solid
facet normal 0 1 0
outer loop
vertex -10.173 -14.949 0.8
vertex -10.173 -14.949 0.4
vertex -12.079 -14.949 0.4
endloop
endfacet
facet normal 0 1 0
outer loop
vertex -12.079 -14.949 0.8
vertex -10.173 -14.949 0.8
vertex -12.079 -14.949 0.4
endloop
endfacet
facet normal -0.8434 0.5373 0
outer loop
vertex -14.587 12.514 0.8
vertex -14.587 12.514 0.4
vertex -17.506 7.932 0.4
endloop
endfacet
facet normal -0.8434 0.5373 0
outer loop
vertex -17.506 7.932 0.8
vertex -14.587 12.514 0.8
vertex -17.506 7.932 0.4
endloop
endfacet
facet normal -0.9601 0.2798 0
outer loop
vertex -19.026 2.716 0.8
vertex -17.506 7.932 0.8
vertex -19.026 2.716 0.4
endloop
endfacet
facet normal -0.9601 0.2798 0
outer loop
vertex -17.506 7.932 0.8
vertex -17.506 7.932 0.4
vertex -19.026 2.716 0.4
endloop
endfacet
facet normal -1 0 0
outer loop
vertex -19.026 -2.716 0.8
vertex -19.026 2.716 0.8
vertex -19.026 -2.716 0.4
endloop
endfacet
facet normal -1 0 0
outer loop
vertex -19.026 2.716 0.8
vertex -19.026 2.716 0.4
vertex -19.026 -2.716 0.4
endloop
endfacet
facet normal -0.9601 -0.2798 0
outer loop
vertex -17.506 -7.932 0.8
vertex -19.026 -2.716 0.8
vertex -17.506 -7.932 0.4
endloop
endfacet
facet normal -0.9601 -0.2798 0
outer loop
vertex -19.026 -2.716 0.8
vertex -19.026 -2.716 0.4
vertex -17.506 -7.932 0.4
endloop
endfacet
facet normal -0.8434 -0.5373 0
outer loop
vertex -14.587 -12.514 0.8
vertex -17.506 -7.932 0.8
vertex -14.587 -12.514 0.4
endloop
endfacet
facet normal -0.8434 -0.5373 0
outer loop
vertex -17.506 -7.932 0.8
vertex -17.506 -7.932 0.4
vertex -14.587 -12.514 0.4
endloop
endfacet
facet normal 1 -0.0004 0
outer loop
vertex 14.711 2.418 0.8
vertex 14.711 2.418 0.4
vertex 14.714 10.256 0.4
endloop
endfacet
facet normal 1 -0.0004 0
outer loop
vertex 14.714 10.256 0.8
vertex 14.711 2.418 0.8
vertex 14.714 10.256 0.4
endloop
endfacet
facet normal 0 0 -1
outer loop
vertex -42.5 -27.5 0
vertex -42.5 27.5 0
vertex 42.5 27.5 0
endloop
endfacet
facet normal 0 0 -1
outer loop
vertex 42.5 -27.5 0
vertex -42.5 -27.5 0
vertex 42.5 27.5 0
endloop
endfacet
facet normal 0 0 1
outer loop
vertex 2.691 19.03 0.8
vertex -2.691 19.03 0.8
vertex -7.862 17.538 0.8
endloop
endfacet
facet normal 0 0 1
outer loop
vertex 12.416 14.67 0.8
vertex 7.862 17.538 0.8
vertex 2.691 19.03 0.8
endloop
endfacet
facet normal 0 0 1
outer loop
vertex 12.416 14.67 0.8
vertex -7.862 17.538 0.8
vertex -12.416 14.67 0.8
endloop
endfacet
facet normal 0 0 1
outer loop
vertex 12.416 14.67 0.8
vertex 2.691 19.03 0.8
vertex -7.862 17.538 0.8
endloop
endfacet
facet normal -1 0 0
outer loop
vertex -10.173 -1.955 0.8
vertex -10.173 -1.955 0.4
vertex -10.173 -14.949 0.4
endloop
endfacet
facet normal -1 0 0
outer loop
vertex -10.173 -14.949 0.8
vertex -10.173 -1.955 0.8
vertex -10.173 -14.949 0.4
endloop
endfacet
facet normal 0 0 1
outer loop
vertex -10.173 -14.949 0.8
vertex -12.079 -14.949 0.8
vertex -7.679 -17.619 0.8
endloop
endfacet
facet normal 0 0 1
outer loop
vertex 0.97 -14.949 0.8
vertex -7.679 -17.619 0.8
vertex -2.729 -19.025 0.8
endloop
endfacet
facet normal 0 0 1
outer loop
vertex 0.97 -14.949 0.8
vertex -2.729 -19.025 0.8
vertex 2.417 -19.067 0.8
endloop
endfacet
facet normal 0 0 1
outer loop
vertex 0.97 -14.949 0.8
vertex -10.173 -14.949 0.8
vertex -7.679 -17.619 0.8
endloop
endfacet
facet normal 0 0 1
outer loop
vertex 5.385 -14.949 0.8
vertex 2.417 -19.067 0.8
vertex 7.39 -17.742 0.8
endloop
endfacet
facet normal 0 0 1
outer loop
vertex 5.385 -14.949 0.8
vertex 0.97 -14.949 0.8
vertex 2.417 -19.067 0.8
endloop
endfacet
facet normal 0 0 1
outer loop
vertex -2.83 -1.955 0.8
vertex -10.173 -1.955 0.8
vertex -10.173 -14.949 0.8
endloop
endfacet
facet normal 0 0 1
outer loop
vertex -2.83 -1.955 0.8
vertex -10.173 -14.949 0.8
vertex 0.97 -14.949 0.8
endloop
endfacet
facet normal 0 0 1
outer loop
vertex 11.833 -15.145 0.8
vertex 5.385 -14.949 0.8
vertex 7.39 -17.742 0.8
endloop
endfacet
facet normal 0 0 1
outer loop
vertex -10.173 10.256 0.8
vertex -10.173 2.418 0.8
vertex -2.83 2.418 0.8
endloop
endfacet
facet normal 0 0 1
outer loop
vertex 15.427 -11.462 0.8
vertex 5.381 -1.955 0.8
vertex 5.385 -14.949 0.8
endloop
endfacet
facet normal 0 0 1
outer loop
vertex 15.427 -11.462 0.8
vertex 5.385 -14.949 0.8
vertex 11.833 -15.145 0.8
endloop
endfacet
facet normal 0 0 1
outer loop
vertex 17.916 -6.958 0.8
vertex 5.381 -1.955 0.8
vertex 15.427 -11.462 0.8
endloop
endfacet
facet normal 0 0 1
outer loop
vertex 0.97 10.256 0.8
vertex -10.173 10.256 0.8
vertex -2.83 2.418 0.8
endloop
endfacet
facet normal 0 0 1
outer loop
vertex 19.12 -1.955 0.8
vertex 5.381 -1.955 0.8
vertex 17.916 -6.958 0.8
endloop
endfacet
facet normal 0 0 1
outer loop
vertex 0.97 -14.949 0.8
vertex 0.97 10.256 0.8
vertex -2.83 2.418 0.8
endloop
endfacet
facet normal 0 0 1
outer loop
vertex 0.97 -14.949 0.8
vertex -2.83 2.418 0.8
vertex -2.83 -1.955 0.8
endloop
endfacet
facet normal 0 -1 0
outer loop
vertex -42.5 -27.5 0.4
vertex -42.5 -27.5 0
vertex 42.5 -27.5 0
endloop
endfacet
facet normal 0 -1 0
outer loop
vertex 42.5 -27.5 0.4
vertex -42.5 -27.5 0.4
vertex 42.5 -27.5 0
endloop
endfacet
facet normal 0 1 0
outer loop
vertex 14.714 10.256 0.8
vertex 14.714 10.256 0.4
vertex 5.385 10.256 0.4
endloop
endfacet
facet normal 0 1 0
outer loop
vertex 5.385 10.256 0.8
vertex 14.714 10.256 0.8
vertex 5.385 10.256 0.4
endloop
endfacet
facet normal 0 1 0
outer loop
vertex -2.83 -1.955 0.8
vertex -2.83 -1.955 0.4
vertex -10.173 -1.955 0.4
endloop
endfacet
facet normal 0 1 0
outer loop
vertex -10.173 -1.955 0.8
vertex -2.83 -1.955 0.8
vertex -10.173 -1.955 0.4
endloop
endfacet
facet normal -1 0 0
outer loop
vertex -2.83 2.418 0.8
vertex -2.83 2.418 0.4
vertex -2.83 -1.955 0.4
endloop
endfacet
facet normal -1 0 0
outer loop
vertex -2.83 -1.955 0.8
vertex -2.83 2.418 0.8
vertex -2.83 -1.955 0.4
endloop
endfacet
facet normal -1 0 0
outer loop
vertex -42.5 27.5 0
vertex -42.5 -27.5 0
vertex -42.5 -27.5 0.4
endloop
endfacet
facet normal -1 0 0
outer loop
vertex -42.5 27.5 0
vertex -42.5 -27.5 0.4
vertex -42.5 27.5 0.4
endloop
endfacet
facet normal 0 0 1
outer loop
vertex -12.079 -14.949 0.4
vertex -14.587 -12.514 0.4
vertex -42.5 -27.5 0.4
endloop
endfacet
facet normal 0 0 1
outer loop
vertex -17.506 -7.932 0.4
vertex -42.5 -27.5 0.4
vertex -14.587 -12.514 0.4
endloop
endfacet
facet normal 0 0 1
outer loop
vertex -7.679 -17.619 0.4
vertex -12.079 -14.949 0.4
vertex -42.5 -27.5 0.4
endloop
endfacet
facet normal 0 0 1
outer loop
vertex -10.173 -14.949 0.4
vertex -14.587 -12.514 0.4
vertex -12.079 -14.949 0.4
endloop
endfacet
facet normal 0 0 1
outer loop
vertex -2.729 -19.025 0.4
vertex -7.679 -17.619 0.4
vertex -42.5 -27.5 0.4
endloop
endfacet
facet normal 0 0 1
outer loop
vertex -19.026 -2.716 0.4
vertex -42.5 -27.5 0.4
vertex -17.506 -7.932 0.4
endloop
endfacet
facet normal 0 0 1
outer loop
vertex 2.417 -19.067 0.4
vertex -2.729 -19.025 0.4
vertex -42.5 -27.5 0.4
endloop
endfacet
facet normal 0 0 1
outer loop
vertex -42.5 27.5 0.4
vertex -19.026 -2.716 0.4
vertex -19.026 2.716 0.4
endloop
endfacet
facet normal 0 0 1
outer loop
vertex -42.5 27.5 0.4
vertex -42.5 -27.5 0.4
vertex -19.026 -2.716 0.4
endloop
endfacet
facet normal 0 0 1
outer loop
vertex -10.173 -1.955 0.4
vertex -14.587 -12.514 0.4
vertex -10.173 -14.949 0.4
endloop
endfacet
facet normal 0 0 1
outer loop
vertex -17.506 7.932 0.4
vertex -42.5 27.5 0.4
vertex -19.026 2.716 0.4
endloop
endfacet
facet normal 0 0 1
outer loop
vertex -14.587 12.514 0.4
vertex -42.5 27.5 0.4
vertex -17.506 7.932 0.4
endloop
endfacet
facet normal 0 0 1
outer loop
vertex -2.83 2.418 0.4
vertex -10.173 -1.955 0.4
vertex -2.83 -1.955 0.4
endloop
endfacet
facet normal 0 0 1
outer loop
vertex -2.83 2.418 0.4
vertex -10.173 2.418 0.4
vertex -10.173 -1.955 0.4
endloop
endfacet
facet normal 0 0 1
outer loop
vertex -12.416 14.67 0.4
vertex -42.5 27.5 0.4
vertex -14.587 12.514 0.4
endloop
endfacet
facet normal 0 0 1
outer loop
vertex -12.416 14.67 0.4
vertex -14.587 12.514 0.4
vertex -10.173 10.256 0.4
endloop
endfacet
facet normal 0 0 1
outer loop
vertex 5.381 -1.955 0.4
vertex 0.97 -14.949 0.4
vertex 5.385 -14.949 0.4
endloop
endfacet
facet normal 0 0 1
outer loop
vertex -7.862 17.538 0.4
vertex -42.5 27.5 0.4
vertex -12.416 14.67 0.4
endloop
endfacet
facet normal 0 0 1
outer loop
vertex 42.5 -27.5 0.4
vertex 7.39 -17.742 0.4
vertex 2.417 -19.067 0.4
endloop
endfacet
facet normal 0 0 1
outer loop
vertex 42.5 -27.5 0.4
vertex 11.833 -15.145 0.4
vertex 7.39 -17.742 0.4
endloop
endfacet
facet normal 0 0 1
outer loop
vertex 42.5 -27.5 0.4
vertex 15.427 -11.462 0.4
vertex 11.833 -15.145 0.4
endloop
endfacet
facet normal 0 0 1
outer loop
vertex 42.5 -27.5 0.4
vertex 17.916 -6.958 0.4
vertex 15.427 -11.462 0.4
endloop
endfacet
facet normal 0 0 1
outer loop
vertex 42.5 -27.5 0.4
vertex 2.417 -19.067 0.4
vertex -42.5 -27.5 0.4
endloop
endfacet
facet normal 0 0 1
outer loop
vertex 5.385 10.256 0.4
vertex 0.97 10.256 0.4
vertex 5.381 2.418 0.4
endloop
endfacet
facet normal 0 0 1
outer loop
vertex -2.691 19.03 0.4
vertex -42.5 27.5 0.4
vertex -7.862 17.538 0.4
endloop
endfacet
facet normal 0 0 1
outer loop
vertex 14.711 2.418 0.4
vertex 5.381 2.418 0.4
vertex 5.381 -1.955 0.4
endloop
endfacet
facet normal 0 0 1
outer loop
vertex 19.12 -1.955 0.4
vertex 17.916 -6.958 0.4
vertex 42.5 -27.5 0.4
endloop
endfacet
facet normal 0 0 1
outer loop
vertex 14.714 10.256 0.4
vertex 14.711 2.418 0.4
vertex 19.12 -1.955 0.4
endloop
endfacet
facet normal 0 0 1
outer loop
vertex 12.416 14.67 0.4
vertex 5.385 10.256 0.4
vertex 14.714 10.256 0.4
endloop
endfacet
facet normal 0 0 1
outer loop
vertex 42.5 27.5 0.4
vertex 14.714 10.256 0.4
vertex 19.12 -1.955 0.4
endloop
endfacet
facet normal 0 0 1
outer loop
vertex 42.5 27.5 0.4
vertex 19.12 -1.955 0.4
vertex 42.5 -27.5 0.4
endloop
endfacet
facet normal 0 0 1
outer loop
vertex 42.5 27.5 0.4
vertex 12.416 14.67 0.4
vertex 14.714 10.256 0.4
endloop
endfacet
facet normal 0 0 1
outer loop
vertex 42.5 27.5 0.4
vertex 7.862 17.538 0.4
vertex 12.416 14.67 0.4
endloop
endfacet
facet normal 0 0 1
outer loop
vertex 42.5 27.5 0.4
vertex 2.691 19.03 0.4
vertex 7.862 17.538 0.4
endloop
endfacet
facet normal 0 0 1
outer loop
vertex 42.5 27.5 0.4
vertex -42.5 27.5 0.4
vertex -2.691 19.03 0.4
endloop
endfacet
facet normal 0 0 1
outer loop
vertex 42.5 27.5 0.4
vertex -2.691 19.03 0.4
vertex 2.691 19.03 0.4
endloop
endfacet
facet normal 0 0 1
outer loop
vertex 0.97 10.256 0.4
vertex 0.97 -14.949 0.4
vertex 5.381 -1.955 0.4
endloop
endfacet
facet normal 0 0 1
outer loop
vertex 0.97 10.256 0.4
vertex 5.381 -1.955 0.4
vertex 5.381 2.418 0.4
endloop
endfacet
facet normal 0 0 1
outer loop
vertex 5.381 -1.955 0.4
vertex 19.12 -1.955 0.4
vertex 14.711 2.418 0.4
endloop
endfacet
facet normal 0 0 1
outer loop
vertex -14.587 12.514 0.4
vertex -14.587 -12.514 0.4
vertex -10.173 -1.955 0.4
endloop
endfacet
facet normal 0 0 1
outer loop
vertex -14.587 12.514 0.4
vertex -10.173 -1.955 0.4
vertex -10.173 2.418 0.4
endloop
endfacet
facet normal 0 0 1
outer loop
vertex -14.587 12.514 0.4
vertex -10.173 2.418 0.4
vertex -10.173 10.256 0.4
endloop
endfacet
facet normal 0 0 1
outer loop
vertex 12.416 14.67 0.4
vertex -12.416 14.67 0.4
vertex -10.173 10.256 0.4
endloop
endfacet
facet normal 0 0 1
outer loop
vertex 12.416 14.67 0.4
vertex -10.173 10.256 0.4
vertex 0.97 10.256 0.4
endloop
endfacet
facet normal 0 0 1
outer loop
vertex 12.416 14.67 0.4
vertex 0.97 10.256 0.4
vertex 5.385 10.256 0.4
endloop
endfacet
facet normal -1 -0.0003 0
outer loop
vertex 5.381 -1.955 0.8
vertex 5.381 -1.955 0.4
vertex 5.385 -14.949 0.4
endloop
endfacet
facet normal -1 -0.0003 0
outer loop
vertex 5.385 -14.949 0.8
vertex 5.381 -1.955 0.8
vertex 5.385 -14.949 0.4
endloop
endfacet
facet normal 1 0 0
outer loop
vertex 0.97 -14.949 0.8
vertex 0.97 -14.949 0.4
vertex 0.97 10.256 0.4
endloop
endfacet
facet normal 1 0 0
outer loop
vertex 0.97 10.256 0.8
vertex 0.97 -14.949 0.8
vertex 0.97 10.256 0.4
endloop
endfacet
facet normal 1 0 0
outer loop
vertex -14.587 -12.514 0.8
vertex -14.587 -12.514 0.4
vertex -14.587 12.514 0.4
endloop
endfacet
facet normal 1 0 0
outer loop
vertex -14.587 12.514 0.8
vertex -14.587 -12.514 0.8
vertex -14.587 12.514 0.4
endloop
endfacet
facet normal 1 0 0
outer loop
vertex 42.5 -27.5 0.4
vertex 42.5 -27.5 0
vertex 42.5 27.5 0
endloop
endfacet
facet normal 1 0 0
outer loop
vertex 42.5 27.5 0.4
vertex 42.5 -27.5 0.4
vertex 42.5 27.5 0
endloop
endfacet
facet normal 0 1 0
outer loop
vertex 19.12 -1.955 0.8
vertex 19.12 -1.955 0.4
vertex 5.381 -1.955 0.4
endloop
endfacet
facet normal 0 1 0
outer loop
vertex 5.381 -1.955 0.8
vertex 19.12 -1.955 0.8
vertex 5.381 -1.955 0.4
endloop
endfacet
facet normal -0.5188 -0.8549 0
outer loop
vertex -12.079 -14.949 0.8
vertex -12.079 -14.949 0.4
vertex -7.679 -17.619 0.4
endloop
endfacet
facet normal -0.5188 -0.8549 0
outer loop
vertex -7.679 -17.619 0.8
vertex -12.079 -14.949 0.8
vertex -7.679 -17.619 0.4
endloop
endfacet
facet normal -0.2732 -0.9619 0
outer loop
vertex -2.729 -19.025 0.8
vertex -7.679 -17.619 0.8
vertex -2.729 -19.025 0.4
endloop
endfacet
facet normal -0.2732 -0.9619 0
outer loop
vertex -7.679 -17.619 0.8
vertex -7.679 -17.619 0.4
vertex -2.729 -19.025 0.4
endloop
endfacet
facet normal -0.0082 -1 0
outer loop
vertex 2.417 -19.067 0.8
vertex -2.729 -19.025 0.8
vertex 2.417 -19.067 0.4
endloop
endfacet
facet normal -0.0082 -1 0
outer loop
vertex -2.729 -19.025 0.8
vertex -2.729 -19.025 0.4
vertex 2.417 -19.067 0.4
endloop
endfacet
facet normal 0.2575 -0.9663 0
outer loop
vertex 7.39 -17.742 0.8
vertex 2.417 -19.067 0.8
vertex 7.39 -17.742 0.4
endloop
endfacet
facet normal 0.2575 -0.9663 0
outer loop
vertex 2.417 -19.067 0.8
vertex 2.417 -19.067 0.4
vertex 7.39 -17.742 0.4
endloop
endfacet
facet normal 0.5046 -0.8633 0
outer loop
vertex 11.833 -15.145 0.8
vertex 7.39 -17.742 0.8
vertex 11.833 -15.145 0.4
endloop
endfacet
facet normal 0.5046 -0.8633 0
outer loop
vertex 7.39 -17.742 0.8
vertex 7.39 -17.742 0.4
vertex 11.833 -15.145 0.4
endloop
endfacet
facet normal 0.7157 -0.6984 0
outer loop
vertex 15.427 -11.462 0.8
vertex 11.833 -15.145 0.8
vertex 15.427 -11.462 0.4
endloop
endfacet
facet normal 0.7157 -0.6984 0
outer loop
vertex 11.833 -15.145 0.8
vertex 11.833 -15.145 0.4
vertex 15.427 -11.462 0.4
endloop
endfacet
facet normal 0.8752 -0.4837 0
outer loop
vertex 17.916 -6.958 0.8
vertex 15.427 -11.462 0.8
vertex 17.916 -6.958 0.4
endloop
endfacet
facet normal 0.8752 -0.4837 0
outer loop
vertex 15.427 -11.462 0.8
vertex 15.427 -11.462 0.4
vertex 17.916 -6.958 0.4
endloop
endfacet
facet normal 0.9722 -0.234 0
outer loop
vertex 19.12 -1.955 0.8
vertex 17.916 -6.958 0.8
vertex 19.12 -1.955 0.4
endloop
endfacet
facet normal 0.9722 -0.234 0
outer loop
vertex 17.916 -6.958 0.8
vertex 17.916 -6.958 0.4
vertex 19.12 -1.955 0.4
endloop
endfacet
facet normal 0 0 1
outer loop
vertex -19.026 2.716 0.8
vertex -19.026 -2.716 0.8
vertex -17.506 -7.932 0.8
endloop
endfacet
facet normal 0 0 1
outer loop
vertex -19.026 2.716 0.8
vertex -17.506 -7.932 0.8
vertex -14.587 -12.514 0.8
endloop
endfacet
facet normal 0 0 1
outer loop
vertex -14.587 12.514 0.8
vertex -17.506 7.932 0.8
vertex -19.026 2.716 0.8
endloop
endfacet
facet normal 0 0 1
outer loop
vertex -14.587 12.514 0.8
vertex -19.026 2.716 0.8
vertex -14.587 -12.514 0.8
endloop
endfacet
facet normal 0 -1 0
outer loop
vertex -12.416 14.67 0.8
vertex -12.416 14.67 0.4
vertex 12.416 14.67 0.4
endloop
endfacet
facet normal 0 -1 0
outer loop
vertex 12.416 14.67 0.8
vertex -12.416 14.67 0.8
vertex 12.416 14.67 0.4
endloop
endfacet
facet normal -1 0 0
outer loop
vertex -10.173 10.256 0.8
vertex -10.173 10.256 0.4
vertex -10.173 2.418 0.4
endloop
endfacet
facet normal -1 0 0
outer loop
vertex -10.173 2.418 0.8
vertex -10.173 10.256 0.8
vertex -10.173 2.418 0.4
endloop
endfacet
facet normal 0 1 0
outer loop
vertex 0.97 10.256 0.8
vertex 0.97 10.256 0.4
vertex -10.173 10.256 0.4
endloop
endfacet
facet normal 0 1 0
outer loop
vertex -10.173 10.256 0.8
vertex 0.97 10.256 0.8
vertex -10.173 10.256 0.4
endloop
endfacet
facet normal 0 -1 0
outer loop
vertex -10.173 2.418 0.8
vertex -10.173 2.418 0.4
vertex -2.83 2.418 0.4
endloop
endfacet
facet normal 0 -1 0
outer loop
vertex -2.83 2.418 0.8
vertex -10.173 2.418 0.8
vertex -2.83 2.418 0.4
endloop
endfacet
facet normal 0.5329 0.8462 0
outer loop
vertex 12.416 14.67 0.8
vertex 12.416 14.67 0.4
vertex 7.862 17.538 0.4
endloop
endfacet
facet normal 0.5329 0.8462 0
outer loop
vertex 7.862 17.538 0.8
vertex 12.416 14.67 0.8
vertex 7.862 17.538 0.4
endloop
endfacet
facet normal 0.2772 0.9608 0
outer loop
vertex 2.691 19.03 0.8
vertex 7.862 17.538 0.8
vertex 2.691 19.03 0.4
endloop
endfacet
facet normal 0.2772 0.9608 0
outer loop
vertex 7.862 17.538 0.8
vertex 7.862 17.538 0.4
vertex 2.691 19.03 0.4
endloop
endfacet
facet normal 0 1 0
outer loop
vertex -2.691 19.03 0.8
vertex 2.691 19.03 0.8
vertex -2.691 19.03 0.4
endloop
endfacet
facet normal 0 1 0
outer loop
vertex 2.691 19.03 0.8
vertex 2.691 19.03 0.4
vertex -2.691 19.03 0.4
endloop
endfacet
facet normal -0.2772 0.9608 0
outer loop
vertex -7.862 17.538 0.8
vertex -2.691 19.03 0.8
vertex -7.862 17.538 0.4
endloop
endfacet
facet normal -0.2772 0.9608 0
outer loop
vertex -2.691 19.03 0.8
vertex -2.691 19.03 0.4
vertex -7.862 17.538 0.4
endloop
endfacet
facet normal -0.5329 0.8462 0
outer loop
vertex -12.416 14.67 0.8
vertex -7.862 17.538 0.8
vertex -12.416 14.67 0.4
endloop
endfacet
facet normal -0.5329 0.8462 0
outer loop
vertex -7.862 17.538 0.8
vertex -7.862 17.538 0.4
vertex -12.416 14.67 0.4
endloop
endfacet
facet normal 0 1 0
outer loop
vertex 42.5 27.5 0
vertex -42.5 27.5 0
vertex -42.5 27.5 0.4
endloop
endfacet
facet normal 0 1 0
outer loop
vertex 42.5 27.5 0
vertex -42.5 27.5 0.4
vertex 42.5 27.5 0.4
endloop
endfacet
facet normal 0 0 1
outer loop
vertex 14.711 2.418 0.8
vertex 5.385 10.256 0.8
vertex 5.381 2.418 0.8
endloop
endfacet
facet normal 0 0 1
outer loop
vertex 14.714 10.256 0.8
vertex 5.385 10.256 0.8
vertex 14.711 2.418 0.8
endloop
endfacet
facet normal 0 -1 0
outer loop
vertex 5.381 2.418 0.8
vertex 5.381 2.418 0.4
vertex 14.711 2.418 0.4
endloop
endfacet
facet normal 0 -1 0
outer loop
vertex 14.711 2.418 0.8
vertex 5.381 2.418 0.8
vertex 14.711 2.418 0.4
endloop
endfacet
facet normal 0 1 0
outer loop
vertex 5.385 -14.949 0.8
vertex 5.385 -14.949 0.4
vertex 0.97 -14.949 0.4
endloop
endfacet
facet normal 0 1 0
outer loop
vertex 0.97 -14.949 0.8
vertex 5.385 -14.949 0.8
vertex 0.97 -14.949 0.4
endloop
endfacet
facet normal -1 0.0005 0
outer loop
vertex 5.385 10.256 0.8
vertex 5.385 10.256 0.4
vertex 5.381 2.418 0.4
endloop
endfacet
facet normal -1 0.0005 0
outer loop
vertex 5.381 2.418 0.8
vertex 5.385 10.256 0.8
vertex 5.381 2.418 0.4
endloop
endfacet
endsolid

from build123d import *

# Parameters (mm, degrees)
F0_W     = 85
F0_H     = 55
F1_DEPTH = 0.4
F3_DEPTH = 0.4


with BuildPart() as f1:
    # F0 (on Top) → F1 (new body)
    with BuildSketch(Plane.XY):
        Rectangle(F0_W, F0_H)
    extrude(amount=F1_DEPTH)

    # F2 (on face) → F3 (join)
    with BuildSketch(Plane.XY.offset(0.4)):
        with BuildLine():
            Line((-10.172568, 10.256139), (-10.172568, 2.418078))
            Line((-10.172568, 2.418078), (-2.829556, 2.418078))
            Line((-2.829556, 2.418078), (-2.829556, -1.954707))
            Line((-2.829556, -1.954707), (-10.172568, -1.954707))
            Line((-10.172568, -1.954707), (-10.172568, -14.949387))
            Line((-10.172568, -14.949387), (-12.078729, -14.949387))
            ThreePointArc((-12.078729, -14.949387), (7.389782, -17.741787), (19.119597, -1.954707))
            Line((19.119597, -1.954707), (5.381422, -1.954707))
            Line((5.381422, -1.954707), (5.384529, -14.949387))
            Line((5.384529, -14.949387), (0.97045, -14.949387))
            Line((0.97045, -14.949387), (0.97045, 10.256139))
            Line((0.97045, 10.256139), (-10.172568, 10.256139))
        make_face()
        with BuildLine():
            ThreePointArc((-14.586647, 12.514376), (-19.219258, 0), (-14.586647, -12.514376))
            Line((-14.586647, -12.514376), (-14.586647, 12.514376))
        make_face()
        Polygon((14.71059, 2.418078), (14.713768, 10.256139), (5.384529, 10.256139), (5.381422, 2.418078), align=None)
        with BuildLine():
            ThreePointArc((12.416224, 14.670285), (0, 19.219258), (-12.416224, 14.670285))
            Line((-12.416224, 14.670285), (0.97045, 14.670285))
            Line((0.97045, 14.670285), (1.213219, 14.670285))
            Line((1.213219, 14.670285), (12.416224, 14.670285))
        make_face()
    extrude(amount=F3_DEPTH)


solid = f1.part
